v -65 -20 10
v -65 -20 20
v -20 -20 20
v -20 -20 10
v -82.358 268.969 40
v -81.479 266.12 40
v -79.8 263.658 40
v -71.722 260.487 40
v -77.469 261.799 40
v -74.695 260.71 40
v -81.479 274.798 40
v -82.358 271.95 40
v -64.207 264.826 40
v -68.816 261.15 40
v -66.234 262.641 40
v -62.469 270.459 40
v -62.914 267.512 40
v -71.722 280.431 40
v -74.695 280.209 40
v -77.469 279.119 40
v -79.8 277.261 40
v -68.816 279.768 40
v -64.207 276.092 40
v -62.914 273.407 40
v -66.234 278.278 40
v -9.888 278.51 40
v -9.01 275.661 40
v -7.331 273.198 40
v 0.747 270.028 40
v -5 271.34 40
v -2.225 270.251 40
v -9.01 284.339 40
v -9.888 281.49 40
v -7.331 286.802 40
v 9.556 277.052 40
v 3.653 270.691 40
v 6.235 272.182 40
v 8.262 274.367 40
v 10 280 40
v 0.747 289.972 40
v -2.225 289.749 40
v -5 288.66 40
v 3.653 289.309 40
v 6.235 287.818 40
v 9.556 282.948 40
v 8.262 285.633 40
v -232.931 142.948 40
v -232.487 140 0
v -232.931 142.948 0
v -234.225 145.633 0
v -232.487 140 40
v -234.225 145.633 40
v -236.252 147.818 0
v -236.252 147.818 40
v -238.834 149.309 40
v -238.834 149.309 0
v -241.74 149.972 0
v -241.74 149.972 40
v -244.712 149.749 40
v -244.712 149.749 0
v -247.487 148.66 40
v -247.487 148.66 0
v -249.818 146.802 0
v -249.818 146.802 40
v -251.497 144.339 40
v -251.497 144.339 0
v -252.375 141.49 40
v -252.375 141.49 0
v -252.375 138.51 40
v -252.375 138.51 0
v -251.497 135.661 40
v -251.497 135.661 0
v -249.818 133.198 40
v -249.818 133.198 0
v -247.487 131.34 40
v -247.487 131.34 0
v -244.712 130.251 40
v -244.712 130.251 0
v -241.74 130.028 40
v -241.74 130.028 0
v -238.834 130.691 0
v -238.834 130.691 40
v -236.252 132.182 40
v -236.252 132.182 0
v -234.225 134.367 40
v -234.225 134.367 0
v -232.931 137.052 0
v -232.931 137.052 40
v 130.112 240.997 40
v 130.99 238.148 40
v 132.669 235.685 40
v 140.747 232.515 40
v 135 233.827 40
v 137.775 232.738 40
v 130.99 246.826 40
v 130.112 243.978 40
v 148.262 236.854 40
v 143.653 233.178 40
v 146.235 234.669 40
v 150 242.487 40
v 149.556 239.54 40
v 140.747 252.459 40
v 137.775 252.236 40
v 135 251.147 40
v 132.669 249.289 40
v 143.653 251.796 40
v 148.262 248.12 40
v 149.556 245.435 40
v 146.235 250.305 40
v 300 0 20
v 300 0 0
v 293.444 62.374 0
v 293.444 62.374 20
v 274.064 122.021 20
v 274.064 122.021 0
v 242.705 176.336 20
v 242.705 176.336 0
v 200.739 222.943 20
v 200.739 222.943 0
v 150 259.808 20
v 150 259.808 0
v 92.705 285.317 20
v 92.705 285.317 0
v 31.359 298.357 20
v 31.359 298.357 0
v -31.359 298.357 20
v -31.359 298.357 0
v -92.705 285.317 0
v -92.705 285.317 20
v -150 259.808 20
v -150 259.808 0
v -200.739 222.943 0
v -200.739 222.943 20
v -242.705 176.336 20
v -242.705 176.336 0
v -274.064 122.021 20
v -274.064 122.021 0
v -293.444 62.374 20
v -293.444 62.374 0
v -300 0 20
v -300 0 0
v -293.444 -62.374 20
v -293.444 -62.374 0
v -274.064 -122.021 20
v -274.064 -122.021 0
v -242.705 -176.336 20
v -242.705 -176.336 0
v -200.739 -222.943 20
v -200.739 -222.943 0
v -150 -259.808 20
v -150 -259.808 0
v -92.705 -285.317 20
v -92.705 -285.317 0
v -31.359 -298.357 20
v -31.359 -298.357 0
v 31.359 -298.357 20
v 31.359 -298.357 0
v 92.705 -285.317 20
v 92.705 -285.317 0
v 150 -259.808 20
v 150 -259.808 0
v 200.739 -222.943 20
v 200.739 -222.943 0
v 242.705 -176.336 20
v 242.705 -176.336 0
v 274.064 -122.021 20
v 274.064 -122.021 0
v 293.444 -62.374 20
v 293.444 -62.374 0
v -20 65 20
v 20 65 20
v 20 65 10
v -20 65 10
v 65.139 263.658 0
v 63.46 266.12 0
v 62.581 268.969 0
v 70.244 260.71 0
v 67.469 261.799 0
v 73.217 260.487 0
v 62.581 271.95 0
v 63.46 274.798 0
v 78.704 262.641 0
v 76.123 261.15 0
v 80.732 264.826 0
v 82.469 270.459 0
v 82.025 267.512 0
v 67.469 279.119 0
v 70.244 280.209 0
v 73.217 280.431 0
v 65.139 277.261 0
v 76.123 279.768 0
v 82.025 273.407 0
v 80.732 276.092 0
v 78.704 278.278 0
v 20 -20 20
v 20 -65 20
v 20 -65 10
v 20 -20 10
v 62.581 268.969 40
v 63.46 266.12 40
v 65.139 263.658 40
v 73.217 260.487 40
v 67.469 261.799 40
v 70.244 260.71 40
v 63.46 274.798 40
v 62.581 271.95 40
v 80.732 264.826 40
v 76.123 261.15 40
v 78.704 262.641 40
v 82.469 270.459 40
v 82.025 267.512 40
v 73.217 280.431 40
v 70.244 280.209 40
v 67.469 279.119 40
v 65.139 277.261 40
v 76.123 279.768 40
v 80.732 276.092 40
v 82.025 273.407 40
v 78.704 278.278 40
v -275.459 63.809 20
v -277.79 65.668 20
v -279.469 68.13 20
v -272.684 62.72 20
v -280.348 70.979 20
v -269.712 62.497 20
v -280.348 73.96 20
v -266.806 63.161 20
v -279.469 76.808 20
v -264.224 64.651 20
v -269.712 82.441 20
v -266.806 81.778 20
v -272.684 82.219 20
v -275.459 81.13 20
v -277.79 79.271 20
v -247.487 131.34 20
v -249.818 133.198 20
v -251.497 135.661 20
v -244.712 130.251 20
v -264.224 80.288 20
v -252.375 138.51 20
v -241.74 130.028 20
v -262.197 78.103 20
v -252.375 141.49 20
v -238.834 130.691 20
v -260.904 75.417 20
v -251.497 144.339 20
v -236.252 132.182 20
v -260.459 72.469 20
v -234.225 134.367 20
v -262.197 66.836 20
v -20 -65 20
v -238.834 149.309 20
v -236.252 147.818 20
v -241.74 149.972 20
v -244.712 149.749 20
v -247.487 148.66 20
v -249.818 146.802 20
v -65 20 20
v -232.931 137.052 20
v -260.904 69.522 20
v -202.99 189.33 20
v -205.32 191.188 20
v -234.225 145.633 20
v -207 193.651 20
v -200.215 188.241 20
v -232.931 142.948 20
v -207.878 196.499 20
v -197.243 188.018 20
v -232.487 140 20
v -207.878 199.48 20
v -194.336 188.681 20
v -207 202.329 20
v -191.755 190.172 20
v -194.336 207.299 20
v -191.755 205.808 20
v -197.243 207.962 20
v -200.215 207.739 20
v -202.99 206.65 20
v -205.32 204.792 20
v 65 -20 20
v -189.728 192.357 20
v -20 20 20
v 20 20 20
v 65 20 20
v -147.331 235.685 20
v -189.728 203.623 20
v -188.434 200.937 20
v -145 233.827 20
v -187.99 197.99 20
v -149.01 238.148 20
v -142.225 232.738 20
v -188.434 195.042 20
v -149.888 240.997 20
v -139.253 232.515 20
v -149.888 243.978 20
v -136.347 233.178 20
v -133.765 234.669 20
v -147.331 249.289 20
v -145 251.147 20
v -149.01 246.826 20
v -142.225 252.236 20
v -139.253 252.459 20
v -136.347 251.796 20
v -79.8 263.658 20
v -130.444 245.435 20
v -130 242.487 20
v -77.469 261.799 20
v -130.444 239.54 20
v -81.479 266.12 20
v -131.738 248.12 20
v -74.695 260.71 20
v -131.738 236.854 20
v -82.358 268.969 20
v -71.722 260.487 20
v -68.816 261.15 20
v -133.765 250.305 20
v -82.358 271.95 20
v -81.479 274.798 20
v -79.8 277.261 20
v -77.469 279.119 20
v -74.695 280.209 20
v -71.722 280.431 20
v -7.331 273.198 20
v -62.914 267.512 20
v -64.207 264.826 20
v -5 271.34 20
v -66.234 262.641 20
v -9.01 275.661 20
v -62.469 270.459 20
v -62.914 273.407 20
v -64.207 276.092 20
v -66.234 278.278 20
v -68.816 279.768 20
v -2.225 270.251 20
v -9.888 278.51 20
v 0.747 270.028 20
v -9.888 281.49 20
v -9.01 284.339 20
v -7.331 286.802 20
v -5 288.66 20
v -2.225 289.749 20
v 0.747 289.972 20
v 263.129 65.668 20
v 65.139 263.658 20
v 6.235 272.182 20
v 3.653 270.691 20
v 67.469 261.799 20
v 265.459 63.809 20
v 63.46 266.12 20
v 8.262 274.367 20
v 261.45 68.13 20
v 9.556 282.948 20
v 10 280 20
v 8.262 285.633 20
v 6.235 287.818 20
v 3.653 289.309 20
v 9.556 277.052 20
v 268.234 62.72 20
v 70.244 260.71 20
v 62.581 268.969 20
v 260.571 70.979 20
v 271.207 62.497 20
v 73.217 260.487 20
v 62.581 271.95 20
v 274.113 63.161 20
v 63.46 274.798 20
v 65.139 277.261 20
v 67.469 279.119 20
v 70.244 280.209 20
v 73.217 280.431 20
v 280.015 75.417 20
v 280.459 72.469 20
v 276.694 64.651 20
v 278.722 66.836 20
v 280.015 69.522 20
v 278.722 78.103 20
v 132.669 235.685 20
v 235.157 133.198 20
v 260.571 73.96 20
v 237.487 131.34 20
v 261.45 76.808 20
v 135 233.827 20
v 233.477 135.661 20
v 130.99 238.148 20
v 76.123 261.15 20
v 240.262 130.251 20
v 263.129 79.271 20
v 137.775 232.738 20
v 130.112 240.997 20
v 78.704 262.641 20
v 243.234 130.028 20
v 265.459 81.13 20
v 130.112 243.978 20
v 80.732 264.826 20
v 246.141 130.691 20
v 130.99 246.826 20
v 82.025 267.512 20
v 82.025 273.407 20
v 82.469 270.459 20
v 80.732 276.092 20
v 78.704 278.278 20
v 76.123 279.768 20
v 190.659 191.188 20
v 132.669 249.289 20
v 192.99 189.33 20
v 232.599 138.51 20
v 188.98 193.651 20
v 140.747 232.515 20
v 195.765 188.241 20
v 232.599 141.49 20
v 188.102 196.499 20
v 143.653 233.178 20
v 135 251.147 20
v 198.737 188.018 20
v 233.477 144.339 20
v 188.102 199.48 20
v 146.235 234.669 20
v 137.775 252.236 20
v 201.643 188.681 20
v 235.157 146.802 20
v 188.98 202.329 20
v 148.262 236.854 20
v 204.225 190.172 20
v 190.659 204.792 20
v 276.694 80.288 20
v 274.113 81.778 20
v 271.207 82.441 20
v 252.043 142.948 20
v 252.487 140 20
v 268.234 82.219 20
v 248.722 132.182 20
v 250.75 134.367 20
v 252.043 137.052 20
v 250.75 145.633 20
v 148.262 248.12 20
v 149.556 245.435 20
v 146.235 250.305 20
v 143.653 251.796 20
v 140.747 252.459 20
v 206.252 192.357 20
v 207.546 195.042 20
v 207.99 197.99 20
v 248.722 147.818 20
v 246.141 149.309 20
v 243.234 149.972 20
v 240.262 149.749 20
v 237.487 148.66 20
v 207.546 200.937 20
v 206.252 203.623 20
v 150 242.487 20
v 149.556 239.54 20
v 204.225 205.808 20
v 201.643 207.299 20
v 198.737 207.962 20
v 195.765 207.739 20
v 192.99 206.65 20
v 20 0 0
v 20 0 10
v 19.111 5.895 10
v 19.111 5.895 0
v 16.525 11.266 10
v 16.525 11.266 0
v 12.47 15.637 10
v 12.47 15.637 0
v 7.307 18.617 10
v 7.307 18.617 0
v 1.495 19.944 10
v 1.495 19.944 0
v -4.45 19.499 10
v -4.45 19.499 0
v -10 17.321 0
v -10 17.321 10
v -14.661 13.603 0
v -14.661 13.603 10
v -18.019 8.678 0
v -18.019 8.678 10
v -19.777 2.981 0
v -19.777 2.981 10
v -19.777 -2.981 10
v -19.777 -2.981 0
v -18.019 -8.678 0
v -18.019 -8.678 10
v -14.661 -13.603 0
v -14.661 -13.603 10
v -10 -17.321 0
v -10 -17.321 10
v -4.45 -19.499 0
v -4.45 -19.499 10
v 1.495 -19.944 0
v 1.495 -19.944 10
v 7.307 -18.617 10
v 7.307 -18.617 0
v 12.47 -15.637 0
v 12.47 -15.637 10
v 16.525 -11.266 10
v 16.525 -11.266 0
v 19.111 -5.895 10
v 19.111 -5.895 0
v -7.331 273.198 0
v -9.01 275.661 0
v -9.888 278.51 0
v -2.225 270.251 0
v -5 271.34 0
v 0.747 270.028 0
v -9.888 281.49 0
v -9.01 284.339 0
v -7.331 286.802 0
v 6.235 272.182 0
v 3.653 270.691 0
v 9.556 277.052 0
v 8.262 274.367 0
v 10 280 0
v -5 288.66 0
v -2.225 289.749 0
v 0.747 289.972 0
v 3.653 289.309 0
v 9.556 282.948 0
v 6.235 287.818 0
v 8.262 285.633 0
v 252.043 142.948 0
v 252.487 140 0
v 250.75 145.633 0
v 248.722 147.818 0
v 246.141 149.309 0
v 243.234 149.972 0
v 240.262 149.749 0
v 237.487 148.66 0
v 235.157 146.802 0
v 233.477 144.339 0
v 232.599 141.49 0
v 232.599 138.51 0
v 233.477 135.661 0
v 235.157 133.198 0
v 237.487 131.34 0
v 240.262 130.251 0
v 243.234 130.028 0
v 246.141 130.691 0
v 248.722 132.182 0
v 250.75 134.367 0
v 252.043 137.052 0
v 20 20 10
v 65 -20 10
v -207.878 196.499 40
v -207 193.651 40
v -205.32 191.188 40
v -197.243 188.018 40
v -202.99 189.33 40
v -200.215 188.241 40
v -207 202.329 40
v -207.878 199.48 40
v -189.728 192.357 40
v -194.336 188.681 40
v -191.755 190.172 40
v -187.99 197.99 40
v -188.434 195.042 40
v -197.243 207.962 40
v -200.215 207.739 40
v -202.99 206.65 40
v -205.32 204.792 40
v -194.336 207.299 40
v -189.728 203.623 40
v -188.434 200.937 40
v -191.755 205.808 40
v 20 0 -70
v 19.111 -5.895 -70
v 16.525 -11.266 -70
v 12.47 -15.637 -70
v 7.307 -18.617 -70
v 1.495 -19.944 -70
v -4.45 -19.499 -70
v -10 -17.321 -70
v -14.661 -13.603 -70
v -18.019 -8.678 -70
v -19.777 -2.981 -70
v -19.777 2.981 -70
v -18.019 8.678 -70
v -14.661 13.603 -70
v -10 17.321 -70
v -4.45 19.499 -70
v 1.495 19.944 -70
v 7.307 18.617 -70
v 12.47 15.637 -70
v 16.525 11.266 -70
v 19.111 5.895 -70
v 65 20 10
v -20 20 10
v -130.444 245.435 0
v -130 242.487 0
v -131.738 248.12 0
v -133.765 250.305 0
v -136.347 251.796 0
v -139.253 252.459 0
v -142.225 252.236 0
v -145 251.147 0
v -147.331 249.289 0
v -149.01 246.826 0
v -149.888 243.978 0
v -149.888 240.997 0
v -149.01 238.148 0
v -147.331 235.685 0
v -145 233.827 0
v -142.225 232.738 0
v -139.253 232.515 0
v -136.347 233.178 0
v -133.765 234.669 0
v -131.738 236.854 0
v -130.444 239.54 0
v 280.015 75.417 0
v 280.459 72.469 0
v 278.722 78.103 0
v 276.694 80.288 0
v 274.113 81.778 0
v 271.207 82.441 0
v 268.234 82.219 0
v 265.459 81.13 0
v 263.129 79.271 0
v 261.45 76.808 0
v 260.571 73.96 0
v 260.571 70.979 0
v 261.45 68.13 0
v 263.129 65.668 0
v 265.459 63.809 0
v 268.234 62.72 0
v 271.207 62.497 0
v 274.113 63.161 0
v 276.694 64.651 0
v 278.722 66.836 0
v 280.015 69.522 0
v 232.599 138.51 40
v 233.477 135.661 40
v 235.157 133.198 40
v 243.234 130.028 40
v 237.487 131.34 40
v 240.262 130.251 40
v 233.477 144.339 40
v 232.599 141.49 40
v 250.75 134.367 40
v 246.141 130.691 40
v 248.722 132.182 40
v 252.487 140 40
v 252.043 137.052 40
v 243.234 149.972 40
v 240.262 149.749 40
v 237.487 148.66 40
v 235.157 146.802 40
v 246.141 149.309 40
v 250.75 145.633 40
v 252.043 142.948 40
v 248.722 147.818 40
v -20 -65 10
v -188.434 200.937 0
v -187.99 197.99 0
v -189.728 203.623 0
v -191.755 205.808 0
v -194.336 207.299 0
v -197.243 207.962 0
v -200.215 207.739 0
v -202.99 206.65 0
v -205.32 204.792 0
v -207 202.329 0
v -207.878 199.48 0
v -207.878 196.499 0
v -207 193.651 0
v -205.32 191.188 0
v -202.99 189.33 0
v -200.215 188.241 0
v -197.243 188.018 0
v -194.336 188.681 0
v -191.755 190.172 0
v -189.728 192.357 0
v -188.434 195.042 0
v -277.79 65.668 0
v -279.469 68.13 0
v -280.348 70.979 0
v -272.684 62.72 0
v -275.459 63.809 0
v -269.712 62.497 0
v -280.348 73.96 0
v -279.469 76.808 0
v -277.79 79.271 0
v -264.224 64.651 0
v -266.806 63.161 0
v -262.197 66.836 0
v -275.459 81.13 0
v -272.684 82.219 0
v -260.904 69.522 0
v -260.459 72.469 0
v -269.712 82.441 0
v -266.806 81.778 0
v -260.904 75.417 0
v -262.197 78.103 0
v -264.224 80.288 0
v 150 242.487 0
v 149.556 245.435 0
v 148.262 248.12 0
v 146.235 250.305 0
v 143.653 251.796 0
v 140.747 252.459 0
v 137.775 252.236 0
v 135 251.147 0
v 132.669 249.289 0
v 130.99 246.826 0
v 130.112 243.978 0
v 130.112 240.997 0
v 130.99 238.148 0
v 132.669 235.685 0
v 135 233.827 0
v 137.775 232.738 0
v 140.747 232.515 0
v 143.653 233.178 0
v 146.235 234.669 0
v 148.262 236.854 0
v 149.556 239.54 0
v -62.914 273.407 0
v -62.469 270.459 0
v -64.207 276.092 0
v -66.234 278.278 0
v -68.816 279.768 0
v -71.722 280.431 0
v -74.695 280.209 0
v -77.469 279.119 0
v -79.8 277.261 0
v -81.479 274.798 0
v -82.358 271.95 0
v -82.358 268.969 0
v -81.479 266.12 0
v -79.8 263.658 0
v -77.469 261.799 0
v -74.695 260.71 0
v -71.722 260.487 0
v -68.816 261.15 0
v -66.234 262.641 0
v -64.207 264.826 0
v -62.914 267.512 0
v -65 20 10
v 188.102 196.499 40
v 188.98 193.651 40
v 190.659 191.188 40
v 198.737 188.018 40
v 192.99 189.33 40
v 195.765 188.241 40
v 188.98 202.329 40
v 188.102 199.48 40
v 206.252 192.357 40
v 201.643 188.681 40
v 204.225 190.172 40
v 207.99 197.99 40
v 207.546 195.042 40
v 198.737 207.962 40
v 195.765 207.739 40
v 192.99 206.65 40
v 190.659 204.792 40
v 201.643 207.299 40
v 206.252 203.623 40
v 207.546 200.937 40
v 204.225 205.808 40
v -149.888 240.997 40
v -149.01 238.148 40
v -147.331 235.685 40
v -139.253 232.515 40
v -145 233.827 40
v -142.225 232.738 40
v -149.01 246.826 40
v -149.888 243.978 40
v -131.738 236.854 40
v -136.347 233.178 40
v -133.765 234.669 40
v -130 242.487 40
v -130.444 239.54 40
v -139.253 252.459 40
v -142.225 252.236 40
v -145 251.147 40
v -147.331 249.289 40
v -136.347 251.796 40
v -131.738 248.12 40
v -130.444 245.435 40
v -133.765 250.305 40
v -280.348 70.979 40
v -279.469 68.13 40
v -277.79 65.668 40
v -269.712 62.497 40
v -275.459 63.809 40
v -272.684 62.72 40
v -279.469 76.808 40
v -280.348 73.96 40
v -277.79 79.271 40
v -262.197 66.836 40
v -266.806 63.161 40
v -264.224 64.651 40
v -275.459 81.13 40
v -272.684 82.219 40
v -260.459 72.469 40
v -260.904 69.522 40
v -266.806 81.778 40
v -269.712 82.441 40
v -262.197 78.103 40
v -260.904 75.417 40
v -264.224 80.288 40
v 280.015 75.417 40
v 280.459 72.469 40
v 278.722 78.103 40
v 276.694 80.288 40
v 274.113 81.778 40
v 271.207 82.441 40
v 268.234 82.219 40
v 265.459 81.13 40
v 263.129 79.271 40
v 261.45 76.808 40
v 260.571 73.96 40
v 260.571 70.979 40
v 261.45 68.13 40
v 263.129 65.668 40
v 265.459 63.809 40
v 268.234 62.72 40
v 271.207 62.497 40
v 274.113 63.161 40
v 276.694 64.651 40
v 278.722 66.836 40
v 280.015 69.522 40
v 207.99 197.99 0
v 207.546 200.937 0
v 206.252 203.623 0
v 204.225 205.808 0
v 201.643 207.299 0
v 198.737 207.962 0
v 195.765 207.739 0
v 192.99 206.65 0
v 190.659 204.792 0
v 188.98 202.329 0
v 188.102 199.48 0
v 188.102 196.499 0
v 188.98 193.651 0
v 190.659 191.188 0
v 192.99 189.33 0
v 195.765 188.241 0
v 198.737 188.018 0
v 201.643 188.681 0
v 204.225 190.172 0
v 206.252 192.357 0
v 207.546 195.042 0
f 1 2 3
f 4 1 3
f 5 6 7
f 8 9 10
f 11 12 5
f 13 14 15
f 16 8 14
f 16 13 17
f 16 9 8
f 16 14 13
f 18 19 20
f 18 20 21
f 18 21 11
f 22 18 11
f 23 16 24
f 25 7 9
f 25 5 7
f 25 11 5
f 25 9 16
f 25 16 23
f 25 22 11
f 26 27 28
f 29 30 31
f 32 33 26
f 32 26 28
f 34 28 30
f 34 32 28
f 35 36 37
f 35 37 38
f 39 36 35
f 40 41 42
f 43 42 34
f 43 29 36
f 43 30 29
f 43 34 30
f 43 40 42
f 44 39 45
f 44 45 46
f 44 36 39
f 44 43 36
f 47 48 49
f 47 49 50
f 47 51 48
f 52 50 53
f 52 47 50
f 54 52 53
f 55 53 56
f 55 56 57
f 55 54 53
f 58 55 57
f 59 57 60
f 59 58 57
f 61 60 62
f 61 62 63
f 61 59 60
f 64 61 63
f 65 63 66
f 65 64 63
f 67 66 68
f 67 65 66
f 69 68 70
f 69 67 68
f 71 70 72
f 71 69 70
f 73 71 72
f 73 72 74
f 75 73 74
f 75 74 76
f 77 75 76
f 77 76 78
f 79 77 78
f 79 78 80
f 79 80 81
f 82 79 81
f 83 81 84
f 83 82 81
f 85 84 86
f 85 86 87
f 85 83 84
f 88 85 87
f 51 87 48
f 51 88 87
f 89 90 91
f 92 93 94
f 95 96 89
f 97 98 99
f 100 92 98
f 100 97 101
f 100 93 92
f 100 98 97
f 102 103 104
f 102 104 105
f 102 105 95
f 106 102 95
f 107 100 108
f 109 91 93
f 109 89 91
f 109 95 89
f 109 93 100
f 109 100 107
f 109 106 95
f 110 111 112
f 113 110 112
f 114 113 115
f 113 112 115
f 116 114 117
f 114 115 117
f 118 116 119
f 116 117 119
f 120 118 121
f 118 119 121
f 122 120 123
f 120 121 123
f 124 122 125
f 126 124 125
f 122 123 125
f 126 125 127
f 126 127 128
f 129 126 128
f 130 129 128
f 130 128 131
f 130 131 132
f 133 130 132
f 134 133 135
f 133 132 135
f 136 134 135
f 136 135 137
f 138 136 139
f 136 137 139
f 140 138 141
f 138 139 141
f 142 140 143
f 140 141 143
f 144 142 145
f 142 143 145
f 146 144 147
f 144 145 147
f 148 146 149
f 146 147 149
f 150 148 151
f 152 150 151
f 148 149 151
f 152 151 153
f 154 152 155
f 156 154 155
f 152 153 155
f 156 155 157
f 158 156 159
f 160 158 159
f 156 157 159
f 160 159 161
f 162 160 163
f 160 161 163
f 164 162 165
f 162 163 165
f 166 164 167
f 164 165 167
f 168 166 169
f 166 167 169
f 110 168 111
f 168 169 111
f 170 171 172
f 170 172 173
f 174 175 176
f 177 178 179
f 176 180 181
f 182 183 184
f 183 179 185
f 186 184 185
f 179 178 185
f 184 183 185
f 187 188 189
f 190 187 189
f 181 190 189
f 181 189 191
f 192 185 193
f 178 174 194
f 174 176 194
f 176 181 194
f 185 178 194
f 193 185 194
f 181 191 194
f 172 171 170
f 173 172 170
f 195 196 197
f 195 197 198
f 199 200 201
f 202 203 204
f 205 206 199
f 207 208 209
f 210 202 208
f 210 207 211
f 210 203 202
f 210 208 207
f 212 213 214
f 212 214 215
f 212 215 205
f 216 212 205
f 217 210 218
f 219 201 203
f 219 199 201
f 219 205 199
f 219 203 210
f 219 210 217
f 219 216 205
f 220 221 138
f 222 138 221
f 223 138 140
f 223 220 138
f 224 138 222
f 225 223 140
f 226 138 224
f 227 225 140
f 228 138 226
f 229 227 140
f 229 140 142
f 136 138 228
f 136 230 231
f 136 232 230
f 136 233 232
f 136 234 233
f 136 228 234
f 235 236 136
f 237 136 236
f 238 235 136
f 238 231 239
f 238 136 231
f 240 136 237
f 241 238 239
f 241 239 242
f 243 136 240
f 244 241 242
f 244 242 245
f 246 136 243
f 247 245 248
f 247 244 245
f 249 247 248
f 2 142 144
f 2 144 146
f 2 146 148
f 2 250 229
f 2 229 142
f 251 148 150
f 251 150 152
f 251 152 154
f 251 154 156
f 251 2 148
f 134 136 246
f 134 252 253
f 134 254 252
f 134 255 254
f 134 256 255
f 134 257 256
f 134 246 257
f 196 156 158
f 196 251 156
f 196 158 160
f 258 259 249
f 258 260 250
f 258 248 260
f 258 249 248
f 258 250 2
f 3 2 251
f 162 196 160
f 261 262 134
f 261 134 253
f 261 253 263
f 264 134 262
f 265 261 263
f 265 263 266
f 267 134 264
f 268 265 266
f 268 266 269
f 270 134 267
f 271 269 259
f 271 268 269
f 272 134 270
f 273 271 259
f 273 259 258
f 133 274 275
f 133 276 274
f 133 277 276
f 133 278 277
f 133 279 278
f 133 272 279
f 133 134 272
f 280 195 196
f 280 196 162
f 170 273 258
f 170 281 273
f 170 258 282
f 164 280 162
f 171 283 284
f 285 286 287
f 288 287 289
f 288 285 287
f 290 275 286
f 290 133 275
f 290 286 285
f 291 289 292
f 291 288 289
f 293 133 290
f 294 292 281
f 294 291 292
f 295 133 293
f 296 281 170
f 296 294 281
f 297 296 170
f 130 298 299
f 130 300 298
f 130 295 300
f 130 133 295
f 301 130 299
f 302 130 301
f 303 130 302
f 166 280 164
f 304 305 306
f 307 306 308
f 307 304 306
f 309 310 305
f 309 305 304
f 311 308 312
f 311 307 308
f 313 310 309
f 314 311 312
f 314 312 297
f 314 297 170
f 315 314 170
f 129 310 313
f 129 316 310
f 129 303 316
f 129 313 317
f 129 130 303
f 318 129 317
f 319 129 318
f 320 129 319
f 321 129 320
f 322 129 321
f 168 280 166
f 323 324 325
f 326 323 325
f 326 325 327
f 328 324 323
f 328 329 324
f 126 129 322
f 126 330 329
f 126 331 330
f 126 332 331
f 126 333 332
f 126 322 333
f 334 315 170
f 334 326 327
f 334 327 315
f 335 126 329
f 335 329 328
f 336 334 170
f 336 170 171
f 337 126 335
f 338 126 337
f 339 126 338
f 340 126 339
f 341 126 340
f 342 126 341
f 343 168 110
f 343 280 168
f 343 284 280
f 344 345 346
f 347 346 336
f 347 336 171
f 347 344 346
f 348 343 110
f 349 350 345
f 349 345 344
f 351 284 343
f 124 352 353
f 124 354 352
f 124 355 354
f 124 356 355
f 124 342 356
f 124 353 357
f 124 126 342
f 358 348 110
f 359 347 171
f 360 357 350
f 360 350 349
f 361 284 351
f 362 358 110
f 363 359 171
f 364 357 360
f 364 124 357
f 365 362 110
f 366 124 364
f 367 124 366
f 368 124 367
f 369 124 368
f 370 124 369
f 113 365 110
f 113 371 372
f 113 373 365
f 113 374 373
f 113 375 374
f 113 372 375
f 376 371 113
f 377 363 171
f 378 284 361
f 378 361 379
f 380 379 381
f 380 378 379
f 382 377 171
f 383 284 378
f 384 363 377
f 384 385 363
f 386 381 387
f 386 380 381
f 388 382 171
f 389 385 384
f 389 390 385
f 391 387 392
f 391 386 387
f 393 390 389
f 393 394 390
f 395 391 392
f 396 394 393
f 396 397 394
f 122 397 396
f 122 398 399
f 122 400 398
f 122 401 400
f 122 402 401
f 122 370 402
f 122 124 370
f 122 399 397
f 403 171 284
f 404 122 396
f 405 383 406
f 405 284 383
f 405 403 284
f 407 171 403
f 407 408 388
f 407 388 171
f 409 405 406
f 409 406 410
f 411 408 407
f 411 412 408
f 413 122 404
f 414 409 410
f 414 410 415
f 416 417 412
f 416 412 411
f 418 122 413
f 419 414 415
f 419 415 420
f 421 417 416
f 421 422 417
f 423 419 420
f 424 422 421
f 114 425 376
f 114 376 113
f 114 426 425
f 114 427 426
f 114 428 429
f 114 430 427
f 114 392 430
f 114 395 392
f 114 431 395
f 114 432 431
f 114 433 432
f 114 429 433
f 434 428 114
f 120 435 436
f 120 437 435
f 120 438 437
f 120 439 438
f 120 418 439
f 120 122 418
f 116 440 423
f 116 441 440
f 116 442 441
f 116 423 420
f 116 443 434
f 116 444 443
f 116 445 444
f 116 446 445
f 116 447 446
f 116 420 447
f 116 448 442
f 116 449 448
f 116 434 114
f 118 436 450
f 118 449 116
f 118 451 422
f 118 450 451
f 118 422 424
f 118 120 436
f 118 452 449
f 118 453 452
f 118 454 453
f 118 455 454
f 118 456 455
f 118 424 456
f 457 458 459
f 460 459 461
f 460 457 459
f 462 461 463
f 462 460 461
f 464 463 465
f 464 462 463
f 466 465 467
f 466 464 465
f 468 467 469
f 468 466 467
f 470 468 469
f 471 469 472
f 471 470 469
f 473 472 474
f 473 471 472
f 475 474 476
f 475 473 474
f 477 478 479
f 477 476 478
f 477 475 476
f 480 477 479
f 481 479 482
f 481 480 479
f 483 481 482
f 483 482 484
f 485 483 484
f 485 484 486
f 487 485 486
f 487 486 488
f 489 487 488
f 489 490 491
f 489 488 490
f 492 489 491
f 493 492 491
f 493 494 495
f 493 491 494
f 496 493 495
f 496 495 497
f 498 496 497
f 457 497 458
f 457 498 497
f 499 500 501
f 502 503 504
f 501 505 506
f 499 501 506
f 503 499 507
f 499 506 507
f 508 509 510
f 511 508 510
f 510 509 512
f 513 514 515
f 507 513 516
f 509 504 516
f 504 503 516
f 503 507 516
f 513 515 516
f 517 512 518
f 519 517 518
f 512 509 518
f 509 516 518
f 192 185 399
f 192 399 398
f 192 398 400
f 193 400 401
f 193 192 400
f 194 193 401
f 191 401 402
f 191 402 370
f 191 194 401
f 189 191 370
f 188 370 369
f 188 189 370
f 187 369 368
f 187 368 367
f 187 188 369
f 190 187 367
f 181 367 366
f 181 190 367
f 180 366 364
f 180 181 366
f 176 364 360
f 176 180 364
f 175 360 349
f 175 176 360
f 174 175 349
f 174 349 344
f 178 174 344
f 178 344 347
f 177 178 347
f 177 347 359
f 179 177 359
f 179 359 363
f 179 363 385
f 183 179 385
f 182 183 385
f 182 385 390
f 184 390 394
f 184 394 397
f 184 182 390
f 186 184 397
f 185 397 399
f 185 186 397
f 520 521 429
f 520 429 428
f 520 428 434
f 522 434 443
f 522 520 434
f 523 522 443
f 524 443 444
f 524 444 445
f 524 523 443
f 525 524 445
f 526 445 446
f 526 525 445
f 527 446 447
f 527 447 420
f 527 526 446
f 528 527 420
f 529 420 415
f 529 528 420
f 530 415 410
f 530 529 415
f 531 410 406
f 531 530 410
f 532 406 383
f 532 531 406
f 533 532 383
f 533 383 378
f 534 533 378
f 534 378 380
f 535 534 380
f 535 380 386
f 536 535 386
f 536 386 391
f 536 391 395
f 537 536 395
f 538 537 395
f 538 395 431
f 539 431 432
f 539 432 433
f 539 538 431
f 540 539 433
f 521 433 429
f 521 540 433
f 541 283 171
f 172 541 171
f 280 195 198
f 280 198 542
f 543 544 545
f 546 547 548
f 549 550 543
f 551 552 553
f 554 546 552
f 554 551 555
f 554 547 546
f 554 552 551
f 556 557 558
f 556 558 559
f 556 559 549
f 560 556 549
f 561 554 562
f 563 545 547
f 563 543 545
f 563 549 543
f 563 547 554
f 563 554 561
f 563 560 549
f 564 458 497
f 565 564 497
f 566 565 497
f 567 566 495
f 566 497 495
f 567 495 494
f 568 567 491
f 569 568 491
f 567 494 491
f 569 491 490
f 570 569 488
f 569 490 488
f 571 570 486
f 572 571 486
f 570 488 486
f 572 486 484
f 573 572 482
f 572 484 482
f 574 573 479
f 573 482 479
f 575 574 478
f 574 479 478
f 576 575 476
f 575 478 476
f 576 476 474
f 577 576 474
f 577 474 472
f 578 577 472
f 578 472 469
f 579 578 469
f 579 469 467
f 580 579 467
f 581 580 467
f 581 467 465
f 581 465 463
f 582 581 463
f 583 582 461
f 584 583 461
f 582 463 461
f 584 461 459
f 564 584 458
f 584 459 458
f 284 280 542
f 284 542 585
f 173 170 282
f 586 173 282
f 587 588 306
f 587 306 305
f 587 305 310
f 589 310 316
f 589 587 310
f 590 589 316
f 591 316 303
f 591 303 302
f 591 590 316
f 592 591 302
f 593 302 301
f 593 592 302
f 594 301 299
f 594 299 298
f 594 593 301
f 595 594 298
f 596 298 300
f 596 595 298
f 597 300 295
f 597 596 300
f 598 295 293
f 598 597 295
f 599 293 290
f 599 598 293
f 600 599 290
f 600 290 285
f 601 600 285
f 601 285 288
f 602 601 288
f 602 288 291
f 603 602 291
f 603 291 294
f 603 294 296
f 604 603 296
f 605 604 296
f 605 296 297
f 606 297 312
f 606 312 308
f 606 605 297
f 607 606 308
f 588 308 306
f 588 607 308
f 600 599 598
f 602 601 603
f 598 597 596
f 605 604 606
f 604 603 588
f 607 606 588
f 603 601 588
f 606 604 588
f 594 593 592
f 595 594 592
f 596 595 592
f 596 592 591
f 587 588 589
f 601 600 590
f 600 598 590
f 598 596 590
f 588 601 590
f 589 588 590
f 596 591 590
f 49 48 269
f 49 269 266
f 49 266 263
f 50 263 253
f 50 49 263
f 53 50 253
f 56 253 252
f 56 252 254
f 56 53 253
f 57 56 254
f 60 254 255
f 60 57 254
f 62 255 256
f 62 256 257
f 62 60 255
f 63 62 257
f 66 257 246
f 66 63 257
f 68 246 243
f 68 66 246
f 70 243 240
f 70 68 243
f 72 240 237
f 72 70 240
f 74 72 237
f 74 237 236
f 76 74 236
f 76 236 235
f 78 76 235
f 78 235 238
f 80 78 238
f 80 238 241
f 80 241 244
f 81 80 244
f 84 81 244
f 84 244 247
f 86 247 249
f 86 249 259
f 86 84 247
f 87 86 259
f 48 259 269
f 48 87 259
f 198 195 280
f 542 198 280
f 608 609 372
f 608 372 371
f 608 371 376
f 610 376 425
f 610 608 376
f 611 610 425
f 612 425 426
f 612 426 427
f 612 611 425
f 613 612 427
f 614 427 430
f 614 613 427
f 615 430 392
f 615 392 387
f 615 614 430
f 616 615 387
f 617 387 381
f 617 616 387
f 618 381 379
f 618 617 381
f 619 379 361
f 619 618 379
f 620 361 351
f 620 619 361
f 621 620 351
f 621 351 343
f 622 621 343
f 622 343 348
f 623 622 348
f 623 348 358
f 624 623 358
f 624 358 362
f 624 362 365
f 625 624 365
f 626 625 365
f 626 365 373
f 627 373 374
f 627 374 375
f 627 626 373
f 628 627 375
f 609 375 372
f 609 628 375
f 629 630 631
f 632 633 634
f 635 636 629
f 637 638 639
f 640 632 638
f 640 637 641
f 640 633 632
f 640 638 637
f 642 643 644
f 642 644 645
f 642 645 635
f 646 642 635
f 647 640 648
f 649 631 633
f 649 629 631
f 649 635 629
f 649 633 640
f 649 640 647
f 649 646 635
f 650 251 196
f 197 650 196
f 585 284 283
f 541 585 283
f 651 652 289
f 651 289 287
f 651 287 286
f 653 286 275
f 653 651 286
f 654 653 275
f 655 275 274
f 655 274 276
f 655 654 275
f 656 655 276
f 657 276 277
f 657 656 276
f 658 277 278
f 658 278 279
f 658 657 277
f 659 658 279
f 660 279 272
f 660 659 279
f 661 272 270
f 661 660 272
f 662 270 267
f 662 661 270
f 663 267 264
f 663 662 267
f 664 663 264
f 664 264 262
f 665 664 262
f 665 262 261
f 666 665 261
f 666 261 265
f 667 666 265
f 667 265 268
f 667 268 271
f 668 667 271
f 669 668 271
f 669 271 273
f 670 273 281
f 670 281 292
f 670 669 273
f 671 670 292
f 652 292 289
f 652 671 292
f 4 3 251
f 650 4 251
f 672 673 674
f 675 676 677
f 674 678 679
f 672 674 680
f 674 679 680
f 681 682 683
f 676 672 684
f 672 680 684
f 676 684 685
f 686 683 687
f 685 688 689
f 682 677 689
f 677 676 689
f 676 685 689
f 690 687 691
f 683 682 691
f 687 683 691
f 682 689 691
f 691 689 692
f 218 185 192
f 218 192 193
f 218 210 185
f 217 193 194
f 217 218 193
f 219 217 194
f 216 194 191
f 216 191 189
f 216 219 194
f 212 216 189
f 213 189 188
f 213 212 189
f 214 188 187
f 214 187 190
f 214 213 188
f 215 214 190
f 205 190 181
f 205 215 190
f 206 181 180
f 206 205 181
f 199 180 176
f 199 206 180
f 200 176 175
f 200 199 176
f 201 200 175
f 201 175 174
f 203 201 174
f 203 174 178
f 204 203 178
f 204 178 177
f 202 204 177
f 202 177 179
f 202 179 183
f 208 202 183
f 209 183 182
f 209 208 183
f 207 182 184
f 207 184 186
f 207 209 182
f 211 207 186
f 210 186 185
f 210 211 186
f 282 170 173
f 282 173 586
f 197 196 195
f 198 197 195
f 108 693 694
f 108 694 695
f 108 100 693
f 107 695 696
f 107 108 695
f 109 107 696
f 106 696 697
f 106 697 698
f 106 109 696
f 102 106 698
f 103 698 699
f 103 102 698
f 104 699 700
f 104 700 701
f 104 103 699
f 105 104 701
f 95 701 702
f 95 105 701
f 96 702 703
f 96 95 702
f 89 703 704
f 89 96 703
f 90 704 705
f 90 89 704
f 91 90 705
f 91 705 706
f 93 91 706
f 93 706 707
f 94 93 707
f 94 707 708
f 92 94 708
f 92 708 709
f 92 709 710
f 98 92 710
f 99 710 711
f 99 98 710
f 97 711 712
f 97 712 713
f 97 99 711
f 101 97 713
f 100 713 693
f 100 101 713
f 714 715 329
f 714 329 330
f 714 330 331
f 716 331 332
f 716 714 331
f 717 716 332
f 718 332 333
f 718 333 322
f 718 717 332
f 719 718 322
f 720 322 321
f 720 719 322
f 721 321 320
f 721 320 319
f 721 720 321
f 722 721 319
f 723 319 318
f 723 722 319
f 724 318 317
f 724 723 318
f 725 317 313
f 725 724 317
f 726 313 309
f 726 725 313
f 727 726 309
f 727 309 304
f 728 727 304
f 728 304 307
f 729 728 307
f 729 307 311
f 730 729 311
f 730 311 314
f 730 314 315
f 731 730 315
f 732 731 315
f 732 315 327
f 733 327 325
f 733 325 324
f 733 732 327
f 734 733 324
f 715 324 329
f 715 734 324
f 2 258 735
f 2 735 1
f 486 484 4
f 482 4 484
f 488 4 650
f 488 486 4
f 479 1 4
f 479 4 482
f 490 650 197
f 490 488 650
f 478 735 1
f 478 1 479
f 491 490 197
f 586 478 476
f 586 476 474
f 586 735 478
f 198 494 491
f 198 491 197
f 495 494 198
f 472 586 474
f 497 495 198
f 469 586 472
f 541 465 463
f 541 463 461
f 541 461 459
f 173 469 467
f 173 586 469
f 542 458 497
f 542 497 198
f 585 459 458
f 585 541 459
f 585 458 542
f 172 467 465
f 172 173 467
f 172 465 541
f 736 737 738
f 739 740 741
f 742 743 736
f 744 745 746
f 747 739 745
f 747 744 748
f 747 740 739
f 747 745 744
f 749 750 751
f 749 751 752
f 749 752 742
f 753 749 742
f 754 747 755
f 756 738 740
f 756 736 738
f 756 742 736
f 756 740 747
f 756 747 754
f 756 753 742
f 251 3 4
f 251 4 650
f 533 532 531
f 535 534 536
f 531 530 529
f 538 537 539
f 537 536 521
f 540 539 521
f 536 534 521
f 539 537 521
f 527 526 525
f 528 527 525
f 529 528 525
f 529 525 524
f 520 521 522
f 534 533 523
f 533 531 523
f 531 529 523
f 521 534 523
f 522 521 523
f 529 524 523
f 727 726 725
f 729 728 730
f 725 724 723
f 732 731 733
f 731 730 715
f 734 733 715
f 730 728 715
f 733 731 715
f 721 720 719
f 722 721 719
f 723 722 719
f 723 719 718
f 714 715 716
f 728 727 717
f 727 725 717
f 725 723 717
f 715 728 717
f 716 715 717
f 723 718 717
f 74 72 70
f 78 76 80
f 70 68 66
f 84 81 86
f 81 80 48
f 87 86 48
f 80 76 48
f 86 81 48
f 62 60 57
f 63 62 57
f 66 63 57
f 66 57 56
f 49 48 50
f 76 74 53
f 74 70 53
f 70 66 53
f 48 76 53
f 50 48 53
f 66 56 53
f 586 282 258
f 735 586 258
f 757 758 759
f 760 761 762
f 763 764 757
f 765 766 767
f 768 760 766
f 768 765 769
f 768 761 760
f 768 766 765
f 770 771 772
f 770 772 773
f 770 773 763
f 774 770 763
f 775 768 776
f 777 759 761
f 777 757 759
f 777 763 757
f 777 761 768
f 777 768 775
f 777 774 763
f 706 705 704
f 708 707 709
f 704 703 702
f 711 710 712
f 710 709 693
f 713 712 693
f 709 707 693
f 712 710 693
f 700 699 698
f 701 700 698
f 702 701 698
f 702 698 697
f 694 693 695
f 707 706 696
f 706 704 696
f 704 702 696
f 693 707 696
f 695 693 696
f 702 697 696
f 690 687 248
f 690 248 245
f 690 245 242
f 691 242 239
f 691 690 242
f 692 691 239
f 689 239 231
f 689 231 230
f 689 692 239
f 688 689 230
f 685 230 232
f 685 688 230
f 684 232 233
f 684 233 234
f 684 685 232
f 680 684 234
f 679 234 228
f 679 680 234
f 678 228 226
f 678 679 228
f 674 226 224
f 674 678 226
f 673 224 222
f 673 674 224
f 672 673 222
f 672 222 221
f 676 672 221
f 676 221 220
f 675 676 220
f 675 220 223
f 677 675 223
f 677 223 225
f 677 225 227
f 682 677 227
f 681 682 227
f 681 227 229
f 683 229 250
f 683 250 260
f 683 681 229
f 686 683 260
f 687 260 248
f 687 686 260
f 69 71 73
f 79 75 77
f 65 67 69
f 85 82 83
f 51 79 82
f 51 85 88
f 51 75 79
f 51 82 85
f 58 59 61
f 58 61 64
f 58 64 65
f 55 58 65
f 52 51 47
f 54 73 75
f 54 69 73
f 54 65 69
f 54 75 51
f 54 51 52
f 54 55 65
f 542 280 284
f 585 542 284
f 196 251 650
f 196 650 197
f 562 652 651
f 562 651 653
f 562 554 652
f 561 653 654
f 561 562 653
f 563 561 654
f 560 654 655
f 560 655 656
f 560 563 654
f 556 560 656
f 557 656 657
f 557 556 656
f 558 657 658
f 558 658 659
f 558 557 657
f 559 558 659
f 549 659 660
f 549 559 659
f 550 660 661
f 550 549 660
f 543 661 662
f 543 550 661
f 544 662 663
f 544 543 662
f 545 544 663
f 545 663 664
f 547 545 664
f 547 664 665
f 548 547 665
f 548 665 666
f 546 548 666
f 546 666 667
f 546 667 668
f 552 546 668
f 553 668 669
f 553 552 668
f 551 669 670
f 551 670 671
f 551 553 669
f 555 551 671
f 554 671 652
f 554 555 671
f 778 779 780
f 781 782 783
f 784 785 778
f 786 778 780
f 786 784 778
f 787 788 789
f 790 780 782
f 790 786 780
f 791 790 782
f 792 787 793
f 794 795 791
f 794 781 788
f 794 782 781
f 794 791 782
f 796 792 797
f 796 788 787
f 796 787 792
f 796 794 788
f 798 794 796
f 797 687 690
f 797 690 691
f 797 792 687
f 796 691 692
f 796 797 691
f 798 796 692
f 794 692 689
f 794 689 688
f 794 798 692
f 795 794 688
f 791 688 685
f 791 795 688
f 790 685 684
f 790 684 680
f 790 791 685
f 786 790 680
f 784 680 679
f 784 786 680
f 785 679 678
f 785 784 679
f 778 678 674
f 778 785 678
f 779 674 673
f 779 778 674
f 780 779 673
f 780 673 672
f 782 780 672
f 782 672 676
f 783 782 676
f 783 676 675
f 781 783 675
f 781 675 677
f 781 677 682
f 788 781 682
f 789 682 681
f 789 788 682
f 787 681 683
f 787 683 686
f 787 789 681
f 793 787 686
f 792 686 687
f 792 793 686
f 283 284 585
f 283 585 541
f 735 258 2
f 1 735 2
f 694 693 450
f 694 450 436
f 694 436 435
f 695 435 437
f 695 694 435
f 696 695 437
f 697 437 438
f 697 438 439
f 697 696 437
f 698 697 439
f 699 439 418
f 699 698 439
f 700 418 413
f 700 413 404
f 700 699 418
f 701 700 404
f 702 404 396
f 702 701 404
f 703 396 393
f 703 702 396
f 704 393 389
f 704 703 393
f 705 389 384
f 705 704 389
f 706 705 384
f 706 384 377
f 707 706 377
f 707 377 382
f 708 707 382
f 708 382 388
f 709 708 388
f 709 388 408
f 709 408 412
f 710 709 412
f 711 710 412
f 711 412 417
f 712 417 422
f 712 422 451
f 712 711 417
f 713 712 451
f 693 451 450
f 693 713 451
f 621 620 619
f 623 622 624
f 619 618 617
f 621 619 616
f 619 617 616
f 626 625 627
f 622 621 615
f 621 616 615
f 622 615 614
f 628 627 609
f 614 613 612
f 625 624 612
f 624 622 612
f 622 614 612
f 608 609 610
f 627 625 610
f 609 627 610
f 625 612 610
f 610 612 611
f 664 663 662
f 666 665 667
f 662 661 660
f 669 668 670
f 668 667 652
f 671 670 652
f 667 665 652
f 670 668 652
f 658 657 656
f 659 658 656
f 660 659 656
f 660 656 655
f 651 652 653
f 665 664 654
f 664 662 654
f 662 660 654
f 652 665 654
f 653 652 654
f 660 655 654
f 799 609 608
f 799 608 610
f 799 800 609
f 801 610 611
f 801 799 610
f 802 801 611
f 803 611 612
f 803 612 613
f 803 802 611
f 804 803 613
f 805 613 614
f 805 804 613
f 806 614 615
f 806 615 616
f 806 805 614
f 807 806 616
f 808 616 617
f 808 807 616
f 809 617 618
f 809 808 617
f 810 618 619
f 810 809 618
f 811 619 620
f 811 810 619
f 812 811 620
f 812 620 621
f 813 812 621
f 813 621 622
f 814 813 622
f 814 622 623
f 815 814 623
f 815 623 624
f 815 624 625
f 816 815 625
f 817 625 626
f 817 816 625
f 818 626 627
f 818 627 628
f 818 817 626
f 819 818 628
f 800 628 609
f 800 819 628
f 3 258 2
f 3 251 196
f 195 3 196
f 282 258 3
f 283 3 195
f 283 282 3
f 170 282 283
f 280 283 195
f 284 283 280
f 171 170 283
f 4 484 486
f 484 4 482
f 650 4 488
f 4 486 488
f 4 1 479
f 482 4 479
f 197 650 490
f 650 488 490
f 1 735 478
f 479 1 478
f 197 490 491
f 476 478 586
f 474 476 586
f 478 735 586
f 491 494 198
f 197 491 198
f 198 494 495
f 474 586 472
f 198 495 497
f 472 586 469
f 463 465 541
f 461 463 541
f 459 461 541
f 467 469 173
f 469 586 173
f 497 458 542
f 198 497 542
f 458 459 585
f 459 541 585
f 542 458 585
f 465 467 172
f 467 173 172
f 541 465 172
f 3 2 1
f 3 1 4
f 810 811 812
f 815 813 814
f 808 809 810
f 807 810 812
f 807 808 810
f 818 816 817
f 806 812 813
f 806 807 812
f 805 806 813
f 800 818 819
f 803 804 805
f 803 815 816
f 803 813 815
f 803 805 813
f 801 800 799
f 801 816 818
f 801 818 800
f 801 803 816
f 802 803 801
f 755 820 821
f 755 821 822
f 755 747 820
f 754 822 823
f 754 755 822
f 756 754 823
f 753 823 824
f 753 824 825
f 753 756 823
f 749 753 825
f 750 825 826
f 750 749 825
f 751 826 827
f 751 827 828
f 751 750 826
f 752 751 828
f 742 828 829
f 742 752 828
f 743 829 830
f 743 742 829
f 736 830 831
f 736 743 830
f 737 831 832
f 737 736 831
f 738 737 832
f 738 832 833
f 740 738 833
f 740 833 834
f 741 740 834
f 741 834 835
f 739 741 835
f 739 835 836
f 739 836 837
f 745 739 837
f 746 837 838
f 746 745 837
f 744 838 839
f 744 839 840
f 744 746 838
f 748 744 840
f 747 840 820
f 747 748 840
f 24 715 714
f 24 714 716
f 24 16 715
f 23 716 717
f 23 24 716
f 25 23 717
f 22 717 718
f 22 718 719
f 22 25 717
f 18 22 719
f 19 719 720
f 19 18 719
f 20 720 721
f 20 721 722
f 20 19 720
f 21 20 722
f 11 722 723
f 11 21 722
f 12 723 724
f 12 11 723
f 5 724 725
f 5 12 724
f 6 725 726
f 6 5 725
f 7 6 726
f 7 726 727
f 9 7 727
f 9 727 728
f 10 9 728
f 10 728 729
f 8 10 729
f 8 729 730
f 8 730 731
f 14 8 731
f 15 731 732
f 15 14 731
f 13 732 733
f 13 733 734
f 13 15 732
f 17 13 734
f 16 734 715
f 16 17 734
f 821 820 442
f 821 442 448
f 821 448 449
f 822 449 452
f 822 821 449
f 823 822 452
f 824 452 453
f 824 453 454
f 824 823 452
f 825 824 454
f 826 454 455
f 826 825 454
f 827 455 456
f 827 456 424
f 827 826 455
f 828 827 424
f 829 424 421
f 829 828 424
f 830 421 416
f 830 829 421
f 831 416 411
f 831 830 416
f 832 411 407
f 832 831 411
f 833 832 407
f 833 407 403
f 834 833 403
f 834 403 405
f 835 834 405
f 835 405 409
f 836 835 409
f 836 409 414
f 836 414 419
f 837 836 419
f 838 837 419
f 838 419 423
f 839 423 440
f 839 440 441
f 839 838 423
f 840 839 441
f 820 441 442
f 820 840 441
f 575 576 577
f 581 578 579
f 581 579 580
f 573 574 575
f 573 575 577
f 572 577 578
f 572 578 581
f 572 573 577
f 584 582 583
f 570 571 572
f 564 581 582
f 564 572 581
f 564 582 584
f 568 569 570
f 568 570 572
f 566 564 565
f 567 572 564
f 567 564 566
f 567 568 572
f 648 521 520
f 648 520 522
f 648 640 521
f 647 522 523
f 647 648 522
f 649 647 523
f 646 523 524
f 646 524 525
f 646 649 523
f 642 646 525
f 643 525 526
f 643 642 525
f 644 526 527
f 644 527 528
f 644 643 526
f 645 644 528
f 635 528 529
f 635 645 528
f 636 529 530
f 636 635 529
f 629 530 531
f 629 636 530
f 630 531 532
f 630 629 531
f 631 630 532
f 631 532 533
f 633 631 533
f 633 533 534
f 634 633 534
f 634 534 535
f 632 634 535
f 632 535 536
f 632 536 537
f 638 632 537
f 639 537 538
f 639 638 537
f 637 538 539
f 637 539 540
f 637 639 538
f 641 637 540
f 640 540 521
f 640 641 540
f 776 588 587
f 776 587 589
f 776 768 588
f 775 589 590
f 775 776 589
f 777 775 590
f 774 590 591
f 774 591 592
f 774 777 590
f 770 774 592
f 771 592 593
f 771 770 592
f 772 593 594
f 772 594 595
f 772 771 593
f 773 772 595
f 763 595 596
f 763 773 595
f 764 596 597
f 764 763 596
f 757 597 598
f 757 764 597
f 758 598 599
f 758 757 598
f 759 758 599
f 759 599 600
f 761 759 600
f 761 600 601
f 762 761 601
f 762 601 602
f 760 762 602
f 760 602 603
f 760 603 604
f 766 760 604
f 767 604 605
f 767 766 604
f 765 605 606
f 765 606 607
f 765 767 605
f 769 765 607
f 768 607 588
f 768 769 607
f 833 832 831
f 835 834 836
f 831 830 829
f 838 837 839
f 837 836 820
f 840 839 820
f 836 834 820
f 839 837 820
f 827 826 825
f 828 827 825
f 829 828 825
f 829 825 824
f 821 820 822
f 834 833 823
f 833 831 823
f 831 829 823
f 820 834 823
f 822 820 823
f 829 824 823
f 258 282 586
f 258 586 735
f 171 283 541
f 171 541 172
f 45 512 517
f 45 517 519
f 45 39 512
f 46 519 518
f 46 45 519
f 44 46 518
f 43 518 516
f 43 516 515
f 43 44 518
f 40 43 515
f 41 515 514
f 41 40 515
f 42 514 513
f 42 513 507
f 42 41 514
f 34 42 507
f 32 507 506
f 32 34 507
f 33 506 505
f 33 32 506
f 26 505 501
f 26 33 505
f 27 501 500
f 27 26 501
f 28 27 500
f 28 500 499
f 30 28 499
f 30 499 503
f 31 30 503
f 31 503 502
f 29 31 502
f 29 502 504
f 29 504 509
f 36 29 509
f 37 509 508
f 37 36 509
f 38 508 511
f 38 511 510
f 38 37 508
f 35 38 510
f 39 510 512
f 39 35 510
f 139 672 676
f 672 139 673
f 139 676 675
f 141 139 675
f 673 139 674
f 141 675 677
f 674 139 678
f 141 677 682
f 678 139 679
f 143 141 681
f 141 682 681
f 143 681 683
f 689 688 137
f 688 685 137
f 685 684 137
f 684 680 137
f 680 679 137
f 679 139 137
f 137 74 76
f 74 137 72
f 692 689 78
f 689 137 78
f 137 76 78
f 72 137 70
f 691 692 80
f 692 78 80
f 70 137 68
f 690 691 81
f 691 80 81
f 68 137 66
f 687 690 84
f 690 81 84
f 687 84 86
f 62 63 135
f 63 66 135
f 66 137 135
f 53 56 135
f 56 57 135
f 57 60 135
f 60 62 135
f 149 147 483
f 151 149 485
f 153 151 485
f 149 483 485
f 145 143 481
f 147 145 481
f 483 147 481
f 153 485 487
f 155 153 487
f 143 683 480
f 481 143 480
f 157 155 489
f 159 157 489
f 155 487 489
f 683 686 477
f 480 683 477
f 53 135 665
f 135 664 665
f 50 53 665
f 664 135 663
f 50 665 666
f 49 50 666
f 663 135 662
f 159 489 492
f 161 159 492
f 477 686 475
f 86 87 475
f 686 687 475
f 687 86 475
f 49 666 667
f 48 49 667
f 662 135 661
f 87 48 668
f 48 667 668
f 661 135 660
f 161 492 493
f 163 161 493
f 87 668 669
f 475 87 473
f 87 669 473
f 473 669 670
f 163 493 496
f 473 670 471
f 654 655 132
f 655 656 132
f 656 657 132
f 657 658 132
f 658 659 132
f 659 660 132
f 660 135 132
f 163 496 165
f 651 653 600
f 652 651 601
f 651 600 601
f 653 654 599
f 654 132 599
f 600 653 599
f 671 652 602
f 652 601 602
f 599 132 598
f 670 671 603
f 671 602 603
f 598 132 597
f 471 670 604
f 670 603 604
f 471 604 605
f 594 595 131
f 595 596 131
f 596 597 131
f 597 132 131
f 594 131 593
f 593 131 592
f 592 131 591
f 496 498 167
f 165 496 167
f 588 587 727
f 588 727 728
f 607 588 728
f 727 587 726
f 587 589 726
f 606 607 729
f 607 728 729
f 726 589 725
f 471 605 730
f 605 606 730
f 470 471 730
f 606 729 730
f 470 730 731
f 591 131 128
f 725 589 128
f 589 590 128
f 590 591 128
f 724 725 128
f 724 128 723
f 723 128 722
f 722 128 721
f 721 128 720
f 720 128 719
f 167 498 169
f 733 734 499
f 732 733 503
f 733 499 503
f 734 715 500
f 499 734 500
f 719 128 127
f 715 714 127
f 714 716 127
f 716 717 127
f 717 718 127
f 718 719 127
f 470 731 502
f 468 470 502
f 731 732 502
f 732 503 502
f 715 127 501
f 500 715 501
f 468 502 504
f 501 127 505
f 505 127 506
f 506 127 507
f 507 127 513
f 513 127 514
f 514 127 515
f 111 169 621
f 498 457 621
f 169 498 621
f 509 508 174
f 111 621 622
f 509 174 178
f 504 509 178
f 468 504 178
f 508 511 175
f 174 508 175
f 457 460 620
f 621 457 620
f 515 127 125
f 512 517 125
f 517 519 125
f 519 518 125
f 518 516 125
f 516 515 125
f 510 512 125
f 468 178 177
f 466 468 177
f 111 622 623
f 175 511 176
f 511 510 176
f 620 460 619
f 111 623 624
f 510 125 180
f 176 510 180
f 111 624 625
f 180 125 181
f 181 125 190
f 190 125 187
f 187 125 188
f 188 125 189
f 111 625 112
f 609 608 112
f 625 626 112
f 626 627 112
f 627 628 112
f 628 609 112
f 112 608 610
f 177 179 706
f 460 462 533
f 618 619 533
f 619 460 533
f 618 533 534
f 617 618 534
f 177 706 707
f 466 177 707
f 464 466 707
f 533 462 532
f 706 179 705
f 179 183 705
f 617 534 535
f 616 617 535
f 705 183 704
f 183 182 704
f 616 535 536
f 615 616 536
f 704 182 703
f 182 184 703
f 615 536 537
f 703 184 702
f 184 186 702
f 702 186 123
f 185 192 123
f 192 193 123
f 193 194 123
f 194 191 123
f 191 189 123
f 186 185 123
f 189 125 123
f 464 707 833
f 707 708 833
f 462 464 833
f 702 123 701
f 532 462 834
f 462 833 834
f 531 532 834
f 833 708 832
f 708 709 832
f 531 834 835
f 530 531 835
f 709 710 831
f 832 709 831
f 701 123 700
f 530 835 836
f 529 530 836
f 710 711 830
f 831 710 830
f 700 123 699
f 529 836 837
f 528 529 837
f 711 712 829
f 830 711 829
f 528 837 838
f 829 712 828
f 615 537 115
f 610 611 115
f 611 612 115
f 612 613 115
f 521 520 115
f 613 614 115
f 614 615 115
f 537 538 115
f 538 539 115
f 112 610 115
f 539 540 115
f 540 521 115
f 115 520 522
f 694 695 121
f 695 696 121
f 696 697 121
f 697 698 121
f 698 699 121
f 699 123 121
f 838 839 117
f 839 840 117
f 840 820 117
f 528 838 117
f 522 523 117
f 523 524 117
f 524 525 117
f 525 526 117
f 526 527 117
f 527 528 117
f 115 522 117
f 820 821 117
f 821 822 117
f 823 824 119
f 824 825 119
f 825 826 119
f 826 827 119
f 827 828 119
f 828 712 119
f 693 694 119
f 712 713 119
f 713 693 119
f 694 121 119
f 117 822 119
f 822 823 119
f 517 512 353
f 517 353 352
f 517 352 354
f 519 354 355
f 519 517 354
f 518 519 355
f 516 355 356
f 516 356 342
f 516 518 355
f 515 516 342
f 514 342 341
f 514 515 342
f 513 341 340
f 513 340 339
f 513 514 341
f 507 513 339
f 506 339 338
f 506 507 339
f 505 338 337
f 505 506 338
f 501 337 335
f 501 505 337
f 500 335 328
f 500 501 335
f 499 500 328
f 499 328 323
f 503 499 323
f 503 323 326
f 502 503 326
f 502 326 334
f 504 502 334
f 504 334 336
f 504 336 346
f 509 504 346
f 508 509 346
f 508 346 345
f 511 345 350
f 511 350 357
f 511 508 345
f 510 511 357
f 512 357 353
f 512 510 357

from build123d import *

# Parameters (mm, degrees)
F0_R     = 300
F0_R_2   = 10
F0_R_3   = 20
F1_DEPTH = 20
F2_R     = 10
F3_DEPTH = 20
F5_DEPTH = 10
F7_DEPTH = 10
F8_R     = 20
F9_DEPTH = 80


with BuildPart() as f1:
    # F0 (on Top) → F1 (new body)
    with BuildSketch(Plane.XY):
        Circle(F0_R)
        with Locations((-270.4592313609, 72.4693326287)):
            Circle(F0_R_2, mode=Mode.SUBTRACT)
        with Locations((-242.4871130596, 140)):
            Circle(F0_R_2, mode=Mode.SUBTRACT)
        with Locations((-197.9898987322, 197.9898987322)):
            Circle(F0_R_2, mode=Mode.SUBTRACT)
        with Locations((-140, 242.4871130596)):
            Circle(F0_R_2, mode=Mode.SUBTRACT)
        with Locations((-72.4693326287, 270.4592313609)):
            Circle(F0_R_2, mode=Mode.SUBTRACT)
        Circle(F0_R_3, mode=Mode.SUBTRACT)
        with Locations((270.4592313609, 72.4693326287)):
            Circle(F0_R_2, mode=Mode.SUBTRACT)
        with Locations((242.4871130596, 140)):
            Circle(F0_R_2, mode=Mode.SUBTRACT)
        with Locations((0, 280)):
            Circle(F0_R_2, mode=Mode.SUBTRACT)
        with Locations((72.4693326287, 270.4592313609)):
            Circle(F0_R_2, mode=Mode.SUBTRACT)
        with Locations((140, 242.4871130596)):
            Circle(F0_R_2, mode=Mode.SUBTRACT)
        with Locations((197.9898987322, 197.9898987322)):
            Circle(F0_R_2, mode=Mode.SUBTRACT)
    extrude(amount=F1_DEPTH)

    # F4 (on face) → F5 (cut)
    with BuildSketch(Plane.XY.offset(20)):
        Polygon((-65, 20), (-65, 0), (-65, -20), (-20, -20), (-20, -65), (0, -65), (20, -65), (20, -20), (65, -20), (65, 0), (65, 20), (20, 20), (20, 65), (0, 65), (-20, 65), (-20, 20), align=None)
    extrude(amount=-F5_DEPTH, mode=Mode.SUBTRACT)


with BuildPart() as f3:
    # F2 (on face) → F3 (new body, symmetric)
    with BuildSketch(Plane.XY.offset(20)):
        with Locations((-270.4592313609, 72.4693326287)):
            Circle(F2_R)
    extrude(amount=F3_DEPTH, both=True)


with BuildPart() as f3b:
    # F2 (on face) → F3, piece 2 (new body, symmetric)
    with BuildSketch(Plane.XY.offset(20)):
        with Locations((-242.4871130596, 140)):
            Circle(F2_R)
    extrude(amount=F3_DEPTH, both=True)


with BuildPart() as f3c:
    # F2 (on face) → F3, piece 3 (new body, symmetric)
    with BuildSketch(Plane.XY.offset(20)):
        with Locations((-197.9898987322, 197.9898987322)):
            Circle(F2_R)
    extrude(amount=F3_DEPTH, both=True)


with BuildPart() as f3d:
    # F2 (on face) → F3, piece 4 (new body, symmetric)
    with BuildSketch(Plane.XY.offset(20)):
        with Locations((-140, 242.4871130596)):
            Circle(F2_R)
    extrude(amount=F3_DEPTH, both=True)


with BuildPart() as f3e:
    # F2 (on face) → F3, piece 5 (new body, symmetric)
    with BuildSketch(Plane.XY.offset(20)):
        with Locations((-72.4693326287, 270.4592313609)):
            Circle(F2_R)
    extrude(amount=F3_DEPTH, both=True)


with BuildPart() as f3f:
    # F2 (on face) → F3, piece 6 (new body, symmetric)
    with BuildSketch(Plane.XY.offset(20)):
        with Locations((0, 280)):
            Circle(F2_R)
    extrude(amount=F3_DEPTH, both=True)


with BuildPart() as f3g:
    # F2 (on face) → F3, piece 7 (new body, symmetric)
    with BuildSketch(Plane.XY.offset(20)):
        with Locations((270.4592313609, 72.4693326287)):
            Circle(F2_R)
    extrude(amount=F3_DEPTH, both=True)


with BuildPart() as f3h:
    # F2 (on face) → F3, piece 8 (new body, symmetric)
    with BuildSketch(Plane.XY.offset(20)):
        with Locations((242.4871130596, 140)):
            Circle(F2_R)
    extrude(amount=F3_DEPTH, both=True)


with BuildPart() as f3i:
    # F2 (on face) → F3, piece 9 (new body, symmetric)
    with BuildSketch(Plane.XY.offset(20)):
        with Locations((197.9898987322, 197.9898987322)):
            Circle(F2_R)
    extrude(amount=F3_DEPTH, both=True)


with BuildPart() as f3j:
    # F2 (on face) → F3, piece 10 (new body, symmetric)
    with BuildSketch(Plane.XY.offset(20)):
        with Locations((140, 242.4871130596)):
            Circle(F2_R)
    extrude(amount=F3_DEPTH, both=True)


with BuildPart() as f3k:
    # F2 (on face) → F3, piece 11 (new body, symmetric)
    with BuildSketch(Plane.XY.offset(20)):
        with Locations((72.4693326287, 270.4592313609)):
            Circle(F2_R)
    extrude(amount=F3_DEPTH, both=True)


with BuildPart() as f7:
    # F6 (on face) → F7 (new body)
    with BuildSketch(Plane.XY.offset(20)):
        Polygon((-65, 20), (-65, -20), (-20, -20), (-20, -65), (20, -65), (20, -20), (65, -20), (65, 20), (20, 20), (20, 65), (-20, 65), (-20, 20), align=None)
    extrude(amount=-F7_DEPTH)

    # F8 (on face) → F9 (join)
    with BuildSketch(Plane(origin=(0, 0, 10), x_dir=(1, 0, 0), z_dir=(0, 0, -1))):
        Circle(F8_R)
    extrude(amount=F9_DEPTH)


solid = Compound([f1.part, f3.part, f3b.part, f3c.part, f3d.part, f3e.part, f3f.part, f3g.part, f3h.part, f3i.part, f3j.part, f3k.part, f7.part])
